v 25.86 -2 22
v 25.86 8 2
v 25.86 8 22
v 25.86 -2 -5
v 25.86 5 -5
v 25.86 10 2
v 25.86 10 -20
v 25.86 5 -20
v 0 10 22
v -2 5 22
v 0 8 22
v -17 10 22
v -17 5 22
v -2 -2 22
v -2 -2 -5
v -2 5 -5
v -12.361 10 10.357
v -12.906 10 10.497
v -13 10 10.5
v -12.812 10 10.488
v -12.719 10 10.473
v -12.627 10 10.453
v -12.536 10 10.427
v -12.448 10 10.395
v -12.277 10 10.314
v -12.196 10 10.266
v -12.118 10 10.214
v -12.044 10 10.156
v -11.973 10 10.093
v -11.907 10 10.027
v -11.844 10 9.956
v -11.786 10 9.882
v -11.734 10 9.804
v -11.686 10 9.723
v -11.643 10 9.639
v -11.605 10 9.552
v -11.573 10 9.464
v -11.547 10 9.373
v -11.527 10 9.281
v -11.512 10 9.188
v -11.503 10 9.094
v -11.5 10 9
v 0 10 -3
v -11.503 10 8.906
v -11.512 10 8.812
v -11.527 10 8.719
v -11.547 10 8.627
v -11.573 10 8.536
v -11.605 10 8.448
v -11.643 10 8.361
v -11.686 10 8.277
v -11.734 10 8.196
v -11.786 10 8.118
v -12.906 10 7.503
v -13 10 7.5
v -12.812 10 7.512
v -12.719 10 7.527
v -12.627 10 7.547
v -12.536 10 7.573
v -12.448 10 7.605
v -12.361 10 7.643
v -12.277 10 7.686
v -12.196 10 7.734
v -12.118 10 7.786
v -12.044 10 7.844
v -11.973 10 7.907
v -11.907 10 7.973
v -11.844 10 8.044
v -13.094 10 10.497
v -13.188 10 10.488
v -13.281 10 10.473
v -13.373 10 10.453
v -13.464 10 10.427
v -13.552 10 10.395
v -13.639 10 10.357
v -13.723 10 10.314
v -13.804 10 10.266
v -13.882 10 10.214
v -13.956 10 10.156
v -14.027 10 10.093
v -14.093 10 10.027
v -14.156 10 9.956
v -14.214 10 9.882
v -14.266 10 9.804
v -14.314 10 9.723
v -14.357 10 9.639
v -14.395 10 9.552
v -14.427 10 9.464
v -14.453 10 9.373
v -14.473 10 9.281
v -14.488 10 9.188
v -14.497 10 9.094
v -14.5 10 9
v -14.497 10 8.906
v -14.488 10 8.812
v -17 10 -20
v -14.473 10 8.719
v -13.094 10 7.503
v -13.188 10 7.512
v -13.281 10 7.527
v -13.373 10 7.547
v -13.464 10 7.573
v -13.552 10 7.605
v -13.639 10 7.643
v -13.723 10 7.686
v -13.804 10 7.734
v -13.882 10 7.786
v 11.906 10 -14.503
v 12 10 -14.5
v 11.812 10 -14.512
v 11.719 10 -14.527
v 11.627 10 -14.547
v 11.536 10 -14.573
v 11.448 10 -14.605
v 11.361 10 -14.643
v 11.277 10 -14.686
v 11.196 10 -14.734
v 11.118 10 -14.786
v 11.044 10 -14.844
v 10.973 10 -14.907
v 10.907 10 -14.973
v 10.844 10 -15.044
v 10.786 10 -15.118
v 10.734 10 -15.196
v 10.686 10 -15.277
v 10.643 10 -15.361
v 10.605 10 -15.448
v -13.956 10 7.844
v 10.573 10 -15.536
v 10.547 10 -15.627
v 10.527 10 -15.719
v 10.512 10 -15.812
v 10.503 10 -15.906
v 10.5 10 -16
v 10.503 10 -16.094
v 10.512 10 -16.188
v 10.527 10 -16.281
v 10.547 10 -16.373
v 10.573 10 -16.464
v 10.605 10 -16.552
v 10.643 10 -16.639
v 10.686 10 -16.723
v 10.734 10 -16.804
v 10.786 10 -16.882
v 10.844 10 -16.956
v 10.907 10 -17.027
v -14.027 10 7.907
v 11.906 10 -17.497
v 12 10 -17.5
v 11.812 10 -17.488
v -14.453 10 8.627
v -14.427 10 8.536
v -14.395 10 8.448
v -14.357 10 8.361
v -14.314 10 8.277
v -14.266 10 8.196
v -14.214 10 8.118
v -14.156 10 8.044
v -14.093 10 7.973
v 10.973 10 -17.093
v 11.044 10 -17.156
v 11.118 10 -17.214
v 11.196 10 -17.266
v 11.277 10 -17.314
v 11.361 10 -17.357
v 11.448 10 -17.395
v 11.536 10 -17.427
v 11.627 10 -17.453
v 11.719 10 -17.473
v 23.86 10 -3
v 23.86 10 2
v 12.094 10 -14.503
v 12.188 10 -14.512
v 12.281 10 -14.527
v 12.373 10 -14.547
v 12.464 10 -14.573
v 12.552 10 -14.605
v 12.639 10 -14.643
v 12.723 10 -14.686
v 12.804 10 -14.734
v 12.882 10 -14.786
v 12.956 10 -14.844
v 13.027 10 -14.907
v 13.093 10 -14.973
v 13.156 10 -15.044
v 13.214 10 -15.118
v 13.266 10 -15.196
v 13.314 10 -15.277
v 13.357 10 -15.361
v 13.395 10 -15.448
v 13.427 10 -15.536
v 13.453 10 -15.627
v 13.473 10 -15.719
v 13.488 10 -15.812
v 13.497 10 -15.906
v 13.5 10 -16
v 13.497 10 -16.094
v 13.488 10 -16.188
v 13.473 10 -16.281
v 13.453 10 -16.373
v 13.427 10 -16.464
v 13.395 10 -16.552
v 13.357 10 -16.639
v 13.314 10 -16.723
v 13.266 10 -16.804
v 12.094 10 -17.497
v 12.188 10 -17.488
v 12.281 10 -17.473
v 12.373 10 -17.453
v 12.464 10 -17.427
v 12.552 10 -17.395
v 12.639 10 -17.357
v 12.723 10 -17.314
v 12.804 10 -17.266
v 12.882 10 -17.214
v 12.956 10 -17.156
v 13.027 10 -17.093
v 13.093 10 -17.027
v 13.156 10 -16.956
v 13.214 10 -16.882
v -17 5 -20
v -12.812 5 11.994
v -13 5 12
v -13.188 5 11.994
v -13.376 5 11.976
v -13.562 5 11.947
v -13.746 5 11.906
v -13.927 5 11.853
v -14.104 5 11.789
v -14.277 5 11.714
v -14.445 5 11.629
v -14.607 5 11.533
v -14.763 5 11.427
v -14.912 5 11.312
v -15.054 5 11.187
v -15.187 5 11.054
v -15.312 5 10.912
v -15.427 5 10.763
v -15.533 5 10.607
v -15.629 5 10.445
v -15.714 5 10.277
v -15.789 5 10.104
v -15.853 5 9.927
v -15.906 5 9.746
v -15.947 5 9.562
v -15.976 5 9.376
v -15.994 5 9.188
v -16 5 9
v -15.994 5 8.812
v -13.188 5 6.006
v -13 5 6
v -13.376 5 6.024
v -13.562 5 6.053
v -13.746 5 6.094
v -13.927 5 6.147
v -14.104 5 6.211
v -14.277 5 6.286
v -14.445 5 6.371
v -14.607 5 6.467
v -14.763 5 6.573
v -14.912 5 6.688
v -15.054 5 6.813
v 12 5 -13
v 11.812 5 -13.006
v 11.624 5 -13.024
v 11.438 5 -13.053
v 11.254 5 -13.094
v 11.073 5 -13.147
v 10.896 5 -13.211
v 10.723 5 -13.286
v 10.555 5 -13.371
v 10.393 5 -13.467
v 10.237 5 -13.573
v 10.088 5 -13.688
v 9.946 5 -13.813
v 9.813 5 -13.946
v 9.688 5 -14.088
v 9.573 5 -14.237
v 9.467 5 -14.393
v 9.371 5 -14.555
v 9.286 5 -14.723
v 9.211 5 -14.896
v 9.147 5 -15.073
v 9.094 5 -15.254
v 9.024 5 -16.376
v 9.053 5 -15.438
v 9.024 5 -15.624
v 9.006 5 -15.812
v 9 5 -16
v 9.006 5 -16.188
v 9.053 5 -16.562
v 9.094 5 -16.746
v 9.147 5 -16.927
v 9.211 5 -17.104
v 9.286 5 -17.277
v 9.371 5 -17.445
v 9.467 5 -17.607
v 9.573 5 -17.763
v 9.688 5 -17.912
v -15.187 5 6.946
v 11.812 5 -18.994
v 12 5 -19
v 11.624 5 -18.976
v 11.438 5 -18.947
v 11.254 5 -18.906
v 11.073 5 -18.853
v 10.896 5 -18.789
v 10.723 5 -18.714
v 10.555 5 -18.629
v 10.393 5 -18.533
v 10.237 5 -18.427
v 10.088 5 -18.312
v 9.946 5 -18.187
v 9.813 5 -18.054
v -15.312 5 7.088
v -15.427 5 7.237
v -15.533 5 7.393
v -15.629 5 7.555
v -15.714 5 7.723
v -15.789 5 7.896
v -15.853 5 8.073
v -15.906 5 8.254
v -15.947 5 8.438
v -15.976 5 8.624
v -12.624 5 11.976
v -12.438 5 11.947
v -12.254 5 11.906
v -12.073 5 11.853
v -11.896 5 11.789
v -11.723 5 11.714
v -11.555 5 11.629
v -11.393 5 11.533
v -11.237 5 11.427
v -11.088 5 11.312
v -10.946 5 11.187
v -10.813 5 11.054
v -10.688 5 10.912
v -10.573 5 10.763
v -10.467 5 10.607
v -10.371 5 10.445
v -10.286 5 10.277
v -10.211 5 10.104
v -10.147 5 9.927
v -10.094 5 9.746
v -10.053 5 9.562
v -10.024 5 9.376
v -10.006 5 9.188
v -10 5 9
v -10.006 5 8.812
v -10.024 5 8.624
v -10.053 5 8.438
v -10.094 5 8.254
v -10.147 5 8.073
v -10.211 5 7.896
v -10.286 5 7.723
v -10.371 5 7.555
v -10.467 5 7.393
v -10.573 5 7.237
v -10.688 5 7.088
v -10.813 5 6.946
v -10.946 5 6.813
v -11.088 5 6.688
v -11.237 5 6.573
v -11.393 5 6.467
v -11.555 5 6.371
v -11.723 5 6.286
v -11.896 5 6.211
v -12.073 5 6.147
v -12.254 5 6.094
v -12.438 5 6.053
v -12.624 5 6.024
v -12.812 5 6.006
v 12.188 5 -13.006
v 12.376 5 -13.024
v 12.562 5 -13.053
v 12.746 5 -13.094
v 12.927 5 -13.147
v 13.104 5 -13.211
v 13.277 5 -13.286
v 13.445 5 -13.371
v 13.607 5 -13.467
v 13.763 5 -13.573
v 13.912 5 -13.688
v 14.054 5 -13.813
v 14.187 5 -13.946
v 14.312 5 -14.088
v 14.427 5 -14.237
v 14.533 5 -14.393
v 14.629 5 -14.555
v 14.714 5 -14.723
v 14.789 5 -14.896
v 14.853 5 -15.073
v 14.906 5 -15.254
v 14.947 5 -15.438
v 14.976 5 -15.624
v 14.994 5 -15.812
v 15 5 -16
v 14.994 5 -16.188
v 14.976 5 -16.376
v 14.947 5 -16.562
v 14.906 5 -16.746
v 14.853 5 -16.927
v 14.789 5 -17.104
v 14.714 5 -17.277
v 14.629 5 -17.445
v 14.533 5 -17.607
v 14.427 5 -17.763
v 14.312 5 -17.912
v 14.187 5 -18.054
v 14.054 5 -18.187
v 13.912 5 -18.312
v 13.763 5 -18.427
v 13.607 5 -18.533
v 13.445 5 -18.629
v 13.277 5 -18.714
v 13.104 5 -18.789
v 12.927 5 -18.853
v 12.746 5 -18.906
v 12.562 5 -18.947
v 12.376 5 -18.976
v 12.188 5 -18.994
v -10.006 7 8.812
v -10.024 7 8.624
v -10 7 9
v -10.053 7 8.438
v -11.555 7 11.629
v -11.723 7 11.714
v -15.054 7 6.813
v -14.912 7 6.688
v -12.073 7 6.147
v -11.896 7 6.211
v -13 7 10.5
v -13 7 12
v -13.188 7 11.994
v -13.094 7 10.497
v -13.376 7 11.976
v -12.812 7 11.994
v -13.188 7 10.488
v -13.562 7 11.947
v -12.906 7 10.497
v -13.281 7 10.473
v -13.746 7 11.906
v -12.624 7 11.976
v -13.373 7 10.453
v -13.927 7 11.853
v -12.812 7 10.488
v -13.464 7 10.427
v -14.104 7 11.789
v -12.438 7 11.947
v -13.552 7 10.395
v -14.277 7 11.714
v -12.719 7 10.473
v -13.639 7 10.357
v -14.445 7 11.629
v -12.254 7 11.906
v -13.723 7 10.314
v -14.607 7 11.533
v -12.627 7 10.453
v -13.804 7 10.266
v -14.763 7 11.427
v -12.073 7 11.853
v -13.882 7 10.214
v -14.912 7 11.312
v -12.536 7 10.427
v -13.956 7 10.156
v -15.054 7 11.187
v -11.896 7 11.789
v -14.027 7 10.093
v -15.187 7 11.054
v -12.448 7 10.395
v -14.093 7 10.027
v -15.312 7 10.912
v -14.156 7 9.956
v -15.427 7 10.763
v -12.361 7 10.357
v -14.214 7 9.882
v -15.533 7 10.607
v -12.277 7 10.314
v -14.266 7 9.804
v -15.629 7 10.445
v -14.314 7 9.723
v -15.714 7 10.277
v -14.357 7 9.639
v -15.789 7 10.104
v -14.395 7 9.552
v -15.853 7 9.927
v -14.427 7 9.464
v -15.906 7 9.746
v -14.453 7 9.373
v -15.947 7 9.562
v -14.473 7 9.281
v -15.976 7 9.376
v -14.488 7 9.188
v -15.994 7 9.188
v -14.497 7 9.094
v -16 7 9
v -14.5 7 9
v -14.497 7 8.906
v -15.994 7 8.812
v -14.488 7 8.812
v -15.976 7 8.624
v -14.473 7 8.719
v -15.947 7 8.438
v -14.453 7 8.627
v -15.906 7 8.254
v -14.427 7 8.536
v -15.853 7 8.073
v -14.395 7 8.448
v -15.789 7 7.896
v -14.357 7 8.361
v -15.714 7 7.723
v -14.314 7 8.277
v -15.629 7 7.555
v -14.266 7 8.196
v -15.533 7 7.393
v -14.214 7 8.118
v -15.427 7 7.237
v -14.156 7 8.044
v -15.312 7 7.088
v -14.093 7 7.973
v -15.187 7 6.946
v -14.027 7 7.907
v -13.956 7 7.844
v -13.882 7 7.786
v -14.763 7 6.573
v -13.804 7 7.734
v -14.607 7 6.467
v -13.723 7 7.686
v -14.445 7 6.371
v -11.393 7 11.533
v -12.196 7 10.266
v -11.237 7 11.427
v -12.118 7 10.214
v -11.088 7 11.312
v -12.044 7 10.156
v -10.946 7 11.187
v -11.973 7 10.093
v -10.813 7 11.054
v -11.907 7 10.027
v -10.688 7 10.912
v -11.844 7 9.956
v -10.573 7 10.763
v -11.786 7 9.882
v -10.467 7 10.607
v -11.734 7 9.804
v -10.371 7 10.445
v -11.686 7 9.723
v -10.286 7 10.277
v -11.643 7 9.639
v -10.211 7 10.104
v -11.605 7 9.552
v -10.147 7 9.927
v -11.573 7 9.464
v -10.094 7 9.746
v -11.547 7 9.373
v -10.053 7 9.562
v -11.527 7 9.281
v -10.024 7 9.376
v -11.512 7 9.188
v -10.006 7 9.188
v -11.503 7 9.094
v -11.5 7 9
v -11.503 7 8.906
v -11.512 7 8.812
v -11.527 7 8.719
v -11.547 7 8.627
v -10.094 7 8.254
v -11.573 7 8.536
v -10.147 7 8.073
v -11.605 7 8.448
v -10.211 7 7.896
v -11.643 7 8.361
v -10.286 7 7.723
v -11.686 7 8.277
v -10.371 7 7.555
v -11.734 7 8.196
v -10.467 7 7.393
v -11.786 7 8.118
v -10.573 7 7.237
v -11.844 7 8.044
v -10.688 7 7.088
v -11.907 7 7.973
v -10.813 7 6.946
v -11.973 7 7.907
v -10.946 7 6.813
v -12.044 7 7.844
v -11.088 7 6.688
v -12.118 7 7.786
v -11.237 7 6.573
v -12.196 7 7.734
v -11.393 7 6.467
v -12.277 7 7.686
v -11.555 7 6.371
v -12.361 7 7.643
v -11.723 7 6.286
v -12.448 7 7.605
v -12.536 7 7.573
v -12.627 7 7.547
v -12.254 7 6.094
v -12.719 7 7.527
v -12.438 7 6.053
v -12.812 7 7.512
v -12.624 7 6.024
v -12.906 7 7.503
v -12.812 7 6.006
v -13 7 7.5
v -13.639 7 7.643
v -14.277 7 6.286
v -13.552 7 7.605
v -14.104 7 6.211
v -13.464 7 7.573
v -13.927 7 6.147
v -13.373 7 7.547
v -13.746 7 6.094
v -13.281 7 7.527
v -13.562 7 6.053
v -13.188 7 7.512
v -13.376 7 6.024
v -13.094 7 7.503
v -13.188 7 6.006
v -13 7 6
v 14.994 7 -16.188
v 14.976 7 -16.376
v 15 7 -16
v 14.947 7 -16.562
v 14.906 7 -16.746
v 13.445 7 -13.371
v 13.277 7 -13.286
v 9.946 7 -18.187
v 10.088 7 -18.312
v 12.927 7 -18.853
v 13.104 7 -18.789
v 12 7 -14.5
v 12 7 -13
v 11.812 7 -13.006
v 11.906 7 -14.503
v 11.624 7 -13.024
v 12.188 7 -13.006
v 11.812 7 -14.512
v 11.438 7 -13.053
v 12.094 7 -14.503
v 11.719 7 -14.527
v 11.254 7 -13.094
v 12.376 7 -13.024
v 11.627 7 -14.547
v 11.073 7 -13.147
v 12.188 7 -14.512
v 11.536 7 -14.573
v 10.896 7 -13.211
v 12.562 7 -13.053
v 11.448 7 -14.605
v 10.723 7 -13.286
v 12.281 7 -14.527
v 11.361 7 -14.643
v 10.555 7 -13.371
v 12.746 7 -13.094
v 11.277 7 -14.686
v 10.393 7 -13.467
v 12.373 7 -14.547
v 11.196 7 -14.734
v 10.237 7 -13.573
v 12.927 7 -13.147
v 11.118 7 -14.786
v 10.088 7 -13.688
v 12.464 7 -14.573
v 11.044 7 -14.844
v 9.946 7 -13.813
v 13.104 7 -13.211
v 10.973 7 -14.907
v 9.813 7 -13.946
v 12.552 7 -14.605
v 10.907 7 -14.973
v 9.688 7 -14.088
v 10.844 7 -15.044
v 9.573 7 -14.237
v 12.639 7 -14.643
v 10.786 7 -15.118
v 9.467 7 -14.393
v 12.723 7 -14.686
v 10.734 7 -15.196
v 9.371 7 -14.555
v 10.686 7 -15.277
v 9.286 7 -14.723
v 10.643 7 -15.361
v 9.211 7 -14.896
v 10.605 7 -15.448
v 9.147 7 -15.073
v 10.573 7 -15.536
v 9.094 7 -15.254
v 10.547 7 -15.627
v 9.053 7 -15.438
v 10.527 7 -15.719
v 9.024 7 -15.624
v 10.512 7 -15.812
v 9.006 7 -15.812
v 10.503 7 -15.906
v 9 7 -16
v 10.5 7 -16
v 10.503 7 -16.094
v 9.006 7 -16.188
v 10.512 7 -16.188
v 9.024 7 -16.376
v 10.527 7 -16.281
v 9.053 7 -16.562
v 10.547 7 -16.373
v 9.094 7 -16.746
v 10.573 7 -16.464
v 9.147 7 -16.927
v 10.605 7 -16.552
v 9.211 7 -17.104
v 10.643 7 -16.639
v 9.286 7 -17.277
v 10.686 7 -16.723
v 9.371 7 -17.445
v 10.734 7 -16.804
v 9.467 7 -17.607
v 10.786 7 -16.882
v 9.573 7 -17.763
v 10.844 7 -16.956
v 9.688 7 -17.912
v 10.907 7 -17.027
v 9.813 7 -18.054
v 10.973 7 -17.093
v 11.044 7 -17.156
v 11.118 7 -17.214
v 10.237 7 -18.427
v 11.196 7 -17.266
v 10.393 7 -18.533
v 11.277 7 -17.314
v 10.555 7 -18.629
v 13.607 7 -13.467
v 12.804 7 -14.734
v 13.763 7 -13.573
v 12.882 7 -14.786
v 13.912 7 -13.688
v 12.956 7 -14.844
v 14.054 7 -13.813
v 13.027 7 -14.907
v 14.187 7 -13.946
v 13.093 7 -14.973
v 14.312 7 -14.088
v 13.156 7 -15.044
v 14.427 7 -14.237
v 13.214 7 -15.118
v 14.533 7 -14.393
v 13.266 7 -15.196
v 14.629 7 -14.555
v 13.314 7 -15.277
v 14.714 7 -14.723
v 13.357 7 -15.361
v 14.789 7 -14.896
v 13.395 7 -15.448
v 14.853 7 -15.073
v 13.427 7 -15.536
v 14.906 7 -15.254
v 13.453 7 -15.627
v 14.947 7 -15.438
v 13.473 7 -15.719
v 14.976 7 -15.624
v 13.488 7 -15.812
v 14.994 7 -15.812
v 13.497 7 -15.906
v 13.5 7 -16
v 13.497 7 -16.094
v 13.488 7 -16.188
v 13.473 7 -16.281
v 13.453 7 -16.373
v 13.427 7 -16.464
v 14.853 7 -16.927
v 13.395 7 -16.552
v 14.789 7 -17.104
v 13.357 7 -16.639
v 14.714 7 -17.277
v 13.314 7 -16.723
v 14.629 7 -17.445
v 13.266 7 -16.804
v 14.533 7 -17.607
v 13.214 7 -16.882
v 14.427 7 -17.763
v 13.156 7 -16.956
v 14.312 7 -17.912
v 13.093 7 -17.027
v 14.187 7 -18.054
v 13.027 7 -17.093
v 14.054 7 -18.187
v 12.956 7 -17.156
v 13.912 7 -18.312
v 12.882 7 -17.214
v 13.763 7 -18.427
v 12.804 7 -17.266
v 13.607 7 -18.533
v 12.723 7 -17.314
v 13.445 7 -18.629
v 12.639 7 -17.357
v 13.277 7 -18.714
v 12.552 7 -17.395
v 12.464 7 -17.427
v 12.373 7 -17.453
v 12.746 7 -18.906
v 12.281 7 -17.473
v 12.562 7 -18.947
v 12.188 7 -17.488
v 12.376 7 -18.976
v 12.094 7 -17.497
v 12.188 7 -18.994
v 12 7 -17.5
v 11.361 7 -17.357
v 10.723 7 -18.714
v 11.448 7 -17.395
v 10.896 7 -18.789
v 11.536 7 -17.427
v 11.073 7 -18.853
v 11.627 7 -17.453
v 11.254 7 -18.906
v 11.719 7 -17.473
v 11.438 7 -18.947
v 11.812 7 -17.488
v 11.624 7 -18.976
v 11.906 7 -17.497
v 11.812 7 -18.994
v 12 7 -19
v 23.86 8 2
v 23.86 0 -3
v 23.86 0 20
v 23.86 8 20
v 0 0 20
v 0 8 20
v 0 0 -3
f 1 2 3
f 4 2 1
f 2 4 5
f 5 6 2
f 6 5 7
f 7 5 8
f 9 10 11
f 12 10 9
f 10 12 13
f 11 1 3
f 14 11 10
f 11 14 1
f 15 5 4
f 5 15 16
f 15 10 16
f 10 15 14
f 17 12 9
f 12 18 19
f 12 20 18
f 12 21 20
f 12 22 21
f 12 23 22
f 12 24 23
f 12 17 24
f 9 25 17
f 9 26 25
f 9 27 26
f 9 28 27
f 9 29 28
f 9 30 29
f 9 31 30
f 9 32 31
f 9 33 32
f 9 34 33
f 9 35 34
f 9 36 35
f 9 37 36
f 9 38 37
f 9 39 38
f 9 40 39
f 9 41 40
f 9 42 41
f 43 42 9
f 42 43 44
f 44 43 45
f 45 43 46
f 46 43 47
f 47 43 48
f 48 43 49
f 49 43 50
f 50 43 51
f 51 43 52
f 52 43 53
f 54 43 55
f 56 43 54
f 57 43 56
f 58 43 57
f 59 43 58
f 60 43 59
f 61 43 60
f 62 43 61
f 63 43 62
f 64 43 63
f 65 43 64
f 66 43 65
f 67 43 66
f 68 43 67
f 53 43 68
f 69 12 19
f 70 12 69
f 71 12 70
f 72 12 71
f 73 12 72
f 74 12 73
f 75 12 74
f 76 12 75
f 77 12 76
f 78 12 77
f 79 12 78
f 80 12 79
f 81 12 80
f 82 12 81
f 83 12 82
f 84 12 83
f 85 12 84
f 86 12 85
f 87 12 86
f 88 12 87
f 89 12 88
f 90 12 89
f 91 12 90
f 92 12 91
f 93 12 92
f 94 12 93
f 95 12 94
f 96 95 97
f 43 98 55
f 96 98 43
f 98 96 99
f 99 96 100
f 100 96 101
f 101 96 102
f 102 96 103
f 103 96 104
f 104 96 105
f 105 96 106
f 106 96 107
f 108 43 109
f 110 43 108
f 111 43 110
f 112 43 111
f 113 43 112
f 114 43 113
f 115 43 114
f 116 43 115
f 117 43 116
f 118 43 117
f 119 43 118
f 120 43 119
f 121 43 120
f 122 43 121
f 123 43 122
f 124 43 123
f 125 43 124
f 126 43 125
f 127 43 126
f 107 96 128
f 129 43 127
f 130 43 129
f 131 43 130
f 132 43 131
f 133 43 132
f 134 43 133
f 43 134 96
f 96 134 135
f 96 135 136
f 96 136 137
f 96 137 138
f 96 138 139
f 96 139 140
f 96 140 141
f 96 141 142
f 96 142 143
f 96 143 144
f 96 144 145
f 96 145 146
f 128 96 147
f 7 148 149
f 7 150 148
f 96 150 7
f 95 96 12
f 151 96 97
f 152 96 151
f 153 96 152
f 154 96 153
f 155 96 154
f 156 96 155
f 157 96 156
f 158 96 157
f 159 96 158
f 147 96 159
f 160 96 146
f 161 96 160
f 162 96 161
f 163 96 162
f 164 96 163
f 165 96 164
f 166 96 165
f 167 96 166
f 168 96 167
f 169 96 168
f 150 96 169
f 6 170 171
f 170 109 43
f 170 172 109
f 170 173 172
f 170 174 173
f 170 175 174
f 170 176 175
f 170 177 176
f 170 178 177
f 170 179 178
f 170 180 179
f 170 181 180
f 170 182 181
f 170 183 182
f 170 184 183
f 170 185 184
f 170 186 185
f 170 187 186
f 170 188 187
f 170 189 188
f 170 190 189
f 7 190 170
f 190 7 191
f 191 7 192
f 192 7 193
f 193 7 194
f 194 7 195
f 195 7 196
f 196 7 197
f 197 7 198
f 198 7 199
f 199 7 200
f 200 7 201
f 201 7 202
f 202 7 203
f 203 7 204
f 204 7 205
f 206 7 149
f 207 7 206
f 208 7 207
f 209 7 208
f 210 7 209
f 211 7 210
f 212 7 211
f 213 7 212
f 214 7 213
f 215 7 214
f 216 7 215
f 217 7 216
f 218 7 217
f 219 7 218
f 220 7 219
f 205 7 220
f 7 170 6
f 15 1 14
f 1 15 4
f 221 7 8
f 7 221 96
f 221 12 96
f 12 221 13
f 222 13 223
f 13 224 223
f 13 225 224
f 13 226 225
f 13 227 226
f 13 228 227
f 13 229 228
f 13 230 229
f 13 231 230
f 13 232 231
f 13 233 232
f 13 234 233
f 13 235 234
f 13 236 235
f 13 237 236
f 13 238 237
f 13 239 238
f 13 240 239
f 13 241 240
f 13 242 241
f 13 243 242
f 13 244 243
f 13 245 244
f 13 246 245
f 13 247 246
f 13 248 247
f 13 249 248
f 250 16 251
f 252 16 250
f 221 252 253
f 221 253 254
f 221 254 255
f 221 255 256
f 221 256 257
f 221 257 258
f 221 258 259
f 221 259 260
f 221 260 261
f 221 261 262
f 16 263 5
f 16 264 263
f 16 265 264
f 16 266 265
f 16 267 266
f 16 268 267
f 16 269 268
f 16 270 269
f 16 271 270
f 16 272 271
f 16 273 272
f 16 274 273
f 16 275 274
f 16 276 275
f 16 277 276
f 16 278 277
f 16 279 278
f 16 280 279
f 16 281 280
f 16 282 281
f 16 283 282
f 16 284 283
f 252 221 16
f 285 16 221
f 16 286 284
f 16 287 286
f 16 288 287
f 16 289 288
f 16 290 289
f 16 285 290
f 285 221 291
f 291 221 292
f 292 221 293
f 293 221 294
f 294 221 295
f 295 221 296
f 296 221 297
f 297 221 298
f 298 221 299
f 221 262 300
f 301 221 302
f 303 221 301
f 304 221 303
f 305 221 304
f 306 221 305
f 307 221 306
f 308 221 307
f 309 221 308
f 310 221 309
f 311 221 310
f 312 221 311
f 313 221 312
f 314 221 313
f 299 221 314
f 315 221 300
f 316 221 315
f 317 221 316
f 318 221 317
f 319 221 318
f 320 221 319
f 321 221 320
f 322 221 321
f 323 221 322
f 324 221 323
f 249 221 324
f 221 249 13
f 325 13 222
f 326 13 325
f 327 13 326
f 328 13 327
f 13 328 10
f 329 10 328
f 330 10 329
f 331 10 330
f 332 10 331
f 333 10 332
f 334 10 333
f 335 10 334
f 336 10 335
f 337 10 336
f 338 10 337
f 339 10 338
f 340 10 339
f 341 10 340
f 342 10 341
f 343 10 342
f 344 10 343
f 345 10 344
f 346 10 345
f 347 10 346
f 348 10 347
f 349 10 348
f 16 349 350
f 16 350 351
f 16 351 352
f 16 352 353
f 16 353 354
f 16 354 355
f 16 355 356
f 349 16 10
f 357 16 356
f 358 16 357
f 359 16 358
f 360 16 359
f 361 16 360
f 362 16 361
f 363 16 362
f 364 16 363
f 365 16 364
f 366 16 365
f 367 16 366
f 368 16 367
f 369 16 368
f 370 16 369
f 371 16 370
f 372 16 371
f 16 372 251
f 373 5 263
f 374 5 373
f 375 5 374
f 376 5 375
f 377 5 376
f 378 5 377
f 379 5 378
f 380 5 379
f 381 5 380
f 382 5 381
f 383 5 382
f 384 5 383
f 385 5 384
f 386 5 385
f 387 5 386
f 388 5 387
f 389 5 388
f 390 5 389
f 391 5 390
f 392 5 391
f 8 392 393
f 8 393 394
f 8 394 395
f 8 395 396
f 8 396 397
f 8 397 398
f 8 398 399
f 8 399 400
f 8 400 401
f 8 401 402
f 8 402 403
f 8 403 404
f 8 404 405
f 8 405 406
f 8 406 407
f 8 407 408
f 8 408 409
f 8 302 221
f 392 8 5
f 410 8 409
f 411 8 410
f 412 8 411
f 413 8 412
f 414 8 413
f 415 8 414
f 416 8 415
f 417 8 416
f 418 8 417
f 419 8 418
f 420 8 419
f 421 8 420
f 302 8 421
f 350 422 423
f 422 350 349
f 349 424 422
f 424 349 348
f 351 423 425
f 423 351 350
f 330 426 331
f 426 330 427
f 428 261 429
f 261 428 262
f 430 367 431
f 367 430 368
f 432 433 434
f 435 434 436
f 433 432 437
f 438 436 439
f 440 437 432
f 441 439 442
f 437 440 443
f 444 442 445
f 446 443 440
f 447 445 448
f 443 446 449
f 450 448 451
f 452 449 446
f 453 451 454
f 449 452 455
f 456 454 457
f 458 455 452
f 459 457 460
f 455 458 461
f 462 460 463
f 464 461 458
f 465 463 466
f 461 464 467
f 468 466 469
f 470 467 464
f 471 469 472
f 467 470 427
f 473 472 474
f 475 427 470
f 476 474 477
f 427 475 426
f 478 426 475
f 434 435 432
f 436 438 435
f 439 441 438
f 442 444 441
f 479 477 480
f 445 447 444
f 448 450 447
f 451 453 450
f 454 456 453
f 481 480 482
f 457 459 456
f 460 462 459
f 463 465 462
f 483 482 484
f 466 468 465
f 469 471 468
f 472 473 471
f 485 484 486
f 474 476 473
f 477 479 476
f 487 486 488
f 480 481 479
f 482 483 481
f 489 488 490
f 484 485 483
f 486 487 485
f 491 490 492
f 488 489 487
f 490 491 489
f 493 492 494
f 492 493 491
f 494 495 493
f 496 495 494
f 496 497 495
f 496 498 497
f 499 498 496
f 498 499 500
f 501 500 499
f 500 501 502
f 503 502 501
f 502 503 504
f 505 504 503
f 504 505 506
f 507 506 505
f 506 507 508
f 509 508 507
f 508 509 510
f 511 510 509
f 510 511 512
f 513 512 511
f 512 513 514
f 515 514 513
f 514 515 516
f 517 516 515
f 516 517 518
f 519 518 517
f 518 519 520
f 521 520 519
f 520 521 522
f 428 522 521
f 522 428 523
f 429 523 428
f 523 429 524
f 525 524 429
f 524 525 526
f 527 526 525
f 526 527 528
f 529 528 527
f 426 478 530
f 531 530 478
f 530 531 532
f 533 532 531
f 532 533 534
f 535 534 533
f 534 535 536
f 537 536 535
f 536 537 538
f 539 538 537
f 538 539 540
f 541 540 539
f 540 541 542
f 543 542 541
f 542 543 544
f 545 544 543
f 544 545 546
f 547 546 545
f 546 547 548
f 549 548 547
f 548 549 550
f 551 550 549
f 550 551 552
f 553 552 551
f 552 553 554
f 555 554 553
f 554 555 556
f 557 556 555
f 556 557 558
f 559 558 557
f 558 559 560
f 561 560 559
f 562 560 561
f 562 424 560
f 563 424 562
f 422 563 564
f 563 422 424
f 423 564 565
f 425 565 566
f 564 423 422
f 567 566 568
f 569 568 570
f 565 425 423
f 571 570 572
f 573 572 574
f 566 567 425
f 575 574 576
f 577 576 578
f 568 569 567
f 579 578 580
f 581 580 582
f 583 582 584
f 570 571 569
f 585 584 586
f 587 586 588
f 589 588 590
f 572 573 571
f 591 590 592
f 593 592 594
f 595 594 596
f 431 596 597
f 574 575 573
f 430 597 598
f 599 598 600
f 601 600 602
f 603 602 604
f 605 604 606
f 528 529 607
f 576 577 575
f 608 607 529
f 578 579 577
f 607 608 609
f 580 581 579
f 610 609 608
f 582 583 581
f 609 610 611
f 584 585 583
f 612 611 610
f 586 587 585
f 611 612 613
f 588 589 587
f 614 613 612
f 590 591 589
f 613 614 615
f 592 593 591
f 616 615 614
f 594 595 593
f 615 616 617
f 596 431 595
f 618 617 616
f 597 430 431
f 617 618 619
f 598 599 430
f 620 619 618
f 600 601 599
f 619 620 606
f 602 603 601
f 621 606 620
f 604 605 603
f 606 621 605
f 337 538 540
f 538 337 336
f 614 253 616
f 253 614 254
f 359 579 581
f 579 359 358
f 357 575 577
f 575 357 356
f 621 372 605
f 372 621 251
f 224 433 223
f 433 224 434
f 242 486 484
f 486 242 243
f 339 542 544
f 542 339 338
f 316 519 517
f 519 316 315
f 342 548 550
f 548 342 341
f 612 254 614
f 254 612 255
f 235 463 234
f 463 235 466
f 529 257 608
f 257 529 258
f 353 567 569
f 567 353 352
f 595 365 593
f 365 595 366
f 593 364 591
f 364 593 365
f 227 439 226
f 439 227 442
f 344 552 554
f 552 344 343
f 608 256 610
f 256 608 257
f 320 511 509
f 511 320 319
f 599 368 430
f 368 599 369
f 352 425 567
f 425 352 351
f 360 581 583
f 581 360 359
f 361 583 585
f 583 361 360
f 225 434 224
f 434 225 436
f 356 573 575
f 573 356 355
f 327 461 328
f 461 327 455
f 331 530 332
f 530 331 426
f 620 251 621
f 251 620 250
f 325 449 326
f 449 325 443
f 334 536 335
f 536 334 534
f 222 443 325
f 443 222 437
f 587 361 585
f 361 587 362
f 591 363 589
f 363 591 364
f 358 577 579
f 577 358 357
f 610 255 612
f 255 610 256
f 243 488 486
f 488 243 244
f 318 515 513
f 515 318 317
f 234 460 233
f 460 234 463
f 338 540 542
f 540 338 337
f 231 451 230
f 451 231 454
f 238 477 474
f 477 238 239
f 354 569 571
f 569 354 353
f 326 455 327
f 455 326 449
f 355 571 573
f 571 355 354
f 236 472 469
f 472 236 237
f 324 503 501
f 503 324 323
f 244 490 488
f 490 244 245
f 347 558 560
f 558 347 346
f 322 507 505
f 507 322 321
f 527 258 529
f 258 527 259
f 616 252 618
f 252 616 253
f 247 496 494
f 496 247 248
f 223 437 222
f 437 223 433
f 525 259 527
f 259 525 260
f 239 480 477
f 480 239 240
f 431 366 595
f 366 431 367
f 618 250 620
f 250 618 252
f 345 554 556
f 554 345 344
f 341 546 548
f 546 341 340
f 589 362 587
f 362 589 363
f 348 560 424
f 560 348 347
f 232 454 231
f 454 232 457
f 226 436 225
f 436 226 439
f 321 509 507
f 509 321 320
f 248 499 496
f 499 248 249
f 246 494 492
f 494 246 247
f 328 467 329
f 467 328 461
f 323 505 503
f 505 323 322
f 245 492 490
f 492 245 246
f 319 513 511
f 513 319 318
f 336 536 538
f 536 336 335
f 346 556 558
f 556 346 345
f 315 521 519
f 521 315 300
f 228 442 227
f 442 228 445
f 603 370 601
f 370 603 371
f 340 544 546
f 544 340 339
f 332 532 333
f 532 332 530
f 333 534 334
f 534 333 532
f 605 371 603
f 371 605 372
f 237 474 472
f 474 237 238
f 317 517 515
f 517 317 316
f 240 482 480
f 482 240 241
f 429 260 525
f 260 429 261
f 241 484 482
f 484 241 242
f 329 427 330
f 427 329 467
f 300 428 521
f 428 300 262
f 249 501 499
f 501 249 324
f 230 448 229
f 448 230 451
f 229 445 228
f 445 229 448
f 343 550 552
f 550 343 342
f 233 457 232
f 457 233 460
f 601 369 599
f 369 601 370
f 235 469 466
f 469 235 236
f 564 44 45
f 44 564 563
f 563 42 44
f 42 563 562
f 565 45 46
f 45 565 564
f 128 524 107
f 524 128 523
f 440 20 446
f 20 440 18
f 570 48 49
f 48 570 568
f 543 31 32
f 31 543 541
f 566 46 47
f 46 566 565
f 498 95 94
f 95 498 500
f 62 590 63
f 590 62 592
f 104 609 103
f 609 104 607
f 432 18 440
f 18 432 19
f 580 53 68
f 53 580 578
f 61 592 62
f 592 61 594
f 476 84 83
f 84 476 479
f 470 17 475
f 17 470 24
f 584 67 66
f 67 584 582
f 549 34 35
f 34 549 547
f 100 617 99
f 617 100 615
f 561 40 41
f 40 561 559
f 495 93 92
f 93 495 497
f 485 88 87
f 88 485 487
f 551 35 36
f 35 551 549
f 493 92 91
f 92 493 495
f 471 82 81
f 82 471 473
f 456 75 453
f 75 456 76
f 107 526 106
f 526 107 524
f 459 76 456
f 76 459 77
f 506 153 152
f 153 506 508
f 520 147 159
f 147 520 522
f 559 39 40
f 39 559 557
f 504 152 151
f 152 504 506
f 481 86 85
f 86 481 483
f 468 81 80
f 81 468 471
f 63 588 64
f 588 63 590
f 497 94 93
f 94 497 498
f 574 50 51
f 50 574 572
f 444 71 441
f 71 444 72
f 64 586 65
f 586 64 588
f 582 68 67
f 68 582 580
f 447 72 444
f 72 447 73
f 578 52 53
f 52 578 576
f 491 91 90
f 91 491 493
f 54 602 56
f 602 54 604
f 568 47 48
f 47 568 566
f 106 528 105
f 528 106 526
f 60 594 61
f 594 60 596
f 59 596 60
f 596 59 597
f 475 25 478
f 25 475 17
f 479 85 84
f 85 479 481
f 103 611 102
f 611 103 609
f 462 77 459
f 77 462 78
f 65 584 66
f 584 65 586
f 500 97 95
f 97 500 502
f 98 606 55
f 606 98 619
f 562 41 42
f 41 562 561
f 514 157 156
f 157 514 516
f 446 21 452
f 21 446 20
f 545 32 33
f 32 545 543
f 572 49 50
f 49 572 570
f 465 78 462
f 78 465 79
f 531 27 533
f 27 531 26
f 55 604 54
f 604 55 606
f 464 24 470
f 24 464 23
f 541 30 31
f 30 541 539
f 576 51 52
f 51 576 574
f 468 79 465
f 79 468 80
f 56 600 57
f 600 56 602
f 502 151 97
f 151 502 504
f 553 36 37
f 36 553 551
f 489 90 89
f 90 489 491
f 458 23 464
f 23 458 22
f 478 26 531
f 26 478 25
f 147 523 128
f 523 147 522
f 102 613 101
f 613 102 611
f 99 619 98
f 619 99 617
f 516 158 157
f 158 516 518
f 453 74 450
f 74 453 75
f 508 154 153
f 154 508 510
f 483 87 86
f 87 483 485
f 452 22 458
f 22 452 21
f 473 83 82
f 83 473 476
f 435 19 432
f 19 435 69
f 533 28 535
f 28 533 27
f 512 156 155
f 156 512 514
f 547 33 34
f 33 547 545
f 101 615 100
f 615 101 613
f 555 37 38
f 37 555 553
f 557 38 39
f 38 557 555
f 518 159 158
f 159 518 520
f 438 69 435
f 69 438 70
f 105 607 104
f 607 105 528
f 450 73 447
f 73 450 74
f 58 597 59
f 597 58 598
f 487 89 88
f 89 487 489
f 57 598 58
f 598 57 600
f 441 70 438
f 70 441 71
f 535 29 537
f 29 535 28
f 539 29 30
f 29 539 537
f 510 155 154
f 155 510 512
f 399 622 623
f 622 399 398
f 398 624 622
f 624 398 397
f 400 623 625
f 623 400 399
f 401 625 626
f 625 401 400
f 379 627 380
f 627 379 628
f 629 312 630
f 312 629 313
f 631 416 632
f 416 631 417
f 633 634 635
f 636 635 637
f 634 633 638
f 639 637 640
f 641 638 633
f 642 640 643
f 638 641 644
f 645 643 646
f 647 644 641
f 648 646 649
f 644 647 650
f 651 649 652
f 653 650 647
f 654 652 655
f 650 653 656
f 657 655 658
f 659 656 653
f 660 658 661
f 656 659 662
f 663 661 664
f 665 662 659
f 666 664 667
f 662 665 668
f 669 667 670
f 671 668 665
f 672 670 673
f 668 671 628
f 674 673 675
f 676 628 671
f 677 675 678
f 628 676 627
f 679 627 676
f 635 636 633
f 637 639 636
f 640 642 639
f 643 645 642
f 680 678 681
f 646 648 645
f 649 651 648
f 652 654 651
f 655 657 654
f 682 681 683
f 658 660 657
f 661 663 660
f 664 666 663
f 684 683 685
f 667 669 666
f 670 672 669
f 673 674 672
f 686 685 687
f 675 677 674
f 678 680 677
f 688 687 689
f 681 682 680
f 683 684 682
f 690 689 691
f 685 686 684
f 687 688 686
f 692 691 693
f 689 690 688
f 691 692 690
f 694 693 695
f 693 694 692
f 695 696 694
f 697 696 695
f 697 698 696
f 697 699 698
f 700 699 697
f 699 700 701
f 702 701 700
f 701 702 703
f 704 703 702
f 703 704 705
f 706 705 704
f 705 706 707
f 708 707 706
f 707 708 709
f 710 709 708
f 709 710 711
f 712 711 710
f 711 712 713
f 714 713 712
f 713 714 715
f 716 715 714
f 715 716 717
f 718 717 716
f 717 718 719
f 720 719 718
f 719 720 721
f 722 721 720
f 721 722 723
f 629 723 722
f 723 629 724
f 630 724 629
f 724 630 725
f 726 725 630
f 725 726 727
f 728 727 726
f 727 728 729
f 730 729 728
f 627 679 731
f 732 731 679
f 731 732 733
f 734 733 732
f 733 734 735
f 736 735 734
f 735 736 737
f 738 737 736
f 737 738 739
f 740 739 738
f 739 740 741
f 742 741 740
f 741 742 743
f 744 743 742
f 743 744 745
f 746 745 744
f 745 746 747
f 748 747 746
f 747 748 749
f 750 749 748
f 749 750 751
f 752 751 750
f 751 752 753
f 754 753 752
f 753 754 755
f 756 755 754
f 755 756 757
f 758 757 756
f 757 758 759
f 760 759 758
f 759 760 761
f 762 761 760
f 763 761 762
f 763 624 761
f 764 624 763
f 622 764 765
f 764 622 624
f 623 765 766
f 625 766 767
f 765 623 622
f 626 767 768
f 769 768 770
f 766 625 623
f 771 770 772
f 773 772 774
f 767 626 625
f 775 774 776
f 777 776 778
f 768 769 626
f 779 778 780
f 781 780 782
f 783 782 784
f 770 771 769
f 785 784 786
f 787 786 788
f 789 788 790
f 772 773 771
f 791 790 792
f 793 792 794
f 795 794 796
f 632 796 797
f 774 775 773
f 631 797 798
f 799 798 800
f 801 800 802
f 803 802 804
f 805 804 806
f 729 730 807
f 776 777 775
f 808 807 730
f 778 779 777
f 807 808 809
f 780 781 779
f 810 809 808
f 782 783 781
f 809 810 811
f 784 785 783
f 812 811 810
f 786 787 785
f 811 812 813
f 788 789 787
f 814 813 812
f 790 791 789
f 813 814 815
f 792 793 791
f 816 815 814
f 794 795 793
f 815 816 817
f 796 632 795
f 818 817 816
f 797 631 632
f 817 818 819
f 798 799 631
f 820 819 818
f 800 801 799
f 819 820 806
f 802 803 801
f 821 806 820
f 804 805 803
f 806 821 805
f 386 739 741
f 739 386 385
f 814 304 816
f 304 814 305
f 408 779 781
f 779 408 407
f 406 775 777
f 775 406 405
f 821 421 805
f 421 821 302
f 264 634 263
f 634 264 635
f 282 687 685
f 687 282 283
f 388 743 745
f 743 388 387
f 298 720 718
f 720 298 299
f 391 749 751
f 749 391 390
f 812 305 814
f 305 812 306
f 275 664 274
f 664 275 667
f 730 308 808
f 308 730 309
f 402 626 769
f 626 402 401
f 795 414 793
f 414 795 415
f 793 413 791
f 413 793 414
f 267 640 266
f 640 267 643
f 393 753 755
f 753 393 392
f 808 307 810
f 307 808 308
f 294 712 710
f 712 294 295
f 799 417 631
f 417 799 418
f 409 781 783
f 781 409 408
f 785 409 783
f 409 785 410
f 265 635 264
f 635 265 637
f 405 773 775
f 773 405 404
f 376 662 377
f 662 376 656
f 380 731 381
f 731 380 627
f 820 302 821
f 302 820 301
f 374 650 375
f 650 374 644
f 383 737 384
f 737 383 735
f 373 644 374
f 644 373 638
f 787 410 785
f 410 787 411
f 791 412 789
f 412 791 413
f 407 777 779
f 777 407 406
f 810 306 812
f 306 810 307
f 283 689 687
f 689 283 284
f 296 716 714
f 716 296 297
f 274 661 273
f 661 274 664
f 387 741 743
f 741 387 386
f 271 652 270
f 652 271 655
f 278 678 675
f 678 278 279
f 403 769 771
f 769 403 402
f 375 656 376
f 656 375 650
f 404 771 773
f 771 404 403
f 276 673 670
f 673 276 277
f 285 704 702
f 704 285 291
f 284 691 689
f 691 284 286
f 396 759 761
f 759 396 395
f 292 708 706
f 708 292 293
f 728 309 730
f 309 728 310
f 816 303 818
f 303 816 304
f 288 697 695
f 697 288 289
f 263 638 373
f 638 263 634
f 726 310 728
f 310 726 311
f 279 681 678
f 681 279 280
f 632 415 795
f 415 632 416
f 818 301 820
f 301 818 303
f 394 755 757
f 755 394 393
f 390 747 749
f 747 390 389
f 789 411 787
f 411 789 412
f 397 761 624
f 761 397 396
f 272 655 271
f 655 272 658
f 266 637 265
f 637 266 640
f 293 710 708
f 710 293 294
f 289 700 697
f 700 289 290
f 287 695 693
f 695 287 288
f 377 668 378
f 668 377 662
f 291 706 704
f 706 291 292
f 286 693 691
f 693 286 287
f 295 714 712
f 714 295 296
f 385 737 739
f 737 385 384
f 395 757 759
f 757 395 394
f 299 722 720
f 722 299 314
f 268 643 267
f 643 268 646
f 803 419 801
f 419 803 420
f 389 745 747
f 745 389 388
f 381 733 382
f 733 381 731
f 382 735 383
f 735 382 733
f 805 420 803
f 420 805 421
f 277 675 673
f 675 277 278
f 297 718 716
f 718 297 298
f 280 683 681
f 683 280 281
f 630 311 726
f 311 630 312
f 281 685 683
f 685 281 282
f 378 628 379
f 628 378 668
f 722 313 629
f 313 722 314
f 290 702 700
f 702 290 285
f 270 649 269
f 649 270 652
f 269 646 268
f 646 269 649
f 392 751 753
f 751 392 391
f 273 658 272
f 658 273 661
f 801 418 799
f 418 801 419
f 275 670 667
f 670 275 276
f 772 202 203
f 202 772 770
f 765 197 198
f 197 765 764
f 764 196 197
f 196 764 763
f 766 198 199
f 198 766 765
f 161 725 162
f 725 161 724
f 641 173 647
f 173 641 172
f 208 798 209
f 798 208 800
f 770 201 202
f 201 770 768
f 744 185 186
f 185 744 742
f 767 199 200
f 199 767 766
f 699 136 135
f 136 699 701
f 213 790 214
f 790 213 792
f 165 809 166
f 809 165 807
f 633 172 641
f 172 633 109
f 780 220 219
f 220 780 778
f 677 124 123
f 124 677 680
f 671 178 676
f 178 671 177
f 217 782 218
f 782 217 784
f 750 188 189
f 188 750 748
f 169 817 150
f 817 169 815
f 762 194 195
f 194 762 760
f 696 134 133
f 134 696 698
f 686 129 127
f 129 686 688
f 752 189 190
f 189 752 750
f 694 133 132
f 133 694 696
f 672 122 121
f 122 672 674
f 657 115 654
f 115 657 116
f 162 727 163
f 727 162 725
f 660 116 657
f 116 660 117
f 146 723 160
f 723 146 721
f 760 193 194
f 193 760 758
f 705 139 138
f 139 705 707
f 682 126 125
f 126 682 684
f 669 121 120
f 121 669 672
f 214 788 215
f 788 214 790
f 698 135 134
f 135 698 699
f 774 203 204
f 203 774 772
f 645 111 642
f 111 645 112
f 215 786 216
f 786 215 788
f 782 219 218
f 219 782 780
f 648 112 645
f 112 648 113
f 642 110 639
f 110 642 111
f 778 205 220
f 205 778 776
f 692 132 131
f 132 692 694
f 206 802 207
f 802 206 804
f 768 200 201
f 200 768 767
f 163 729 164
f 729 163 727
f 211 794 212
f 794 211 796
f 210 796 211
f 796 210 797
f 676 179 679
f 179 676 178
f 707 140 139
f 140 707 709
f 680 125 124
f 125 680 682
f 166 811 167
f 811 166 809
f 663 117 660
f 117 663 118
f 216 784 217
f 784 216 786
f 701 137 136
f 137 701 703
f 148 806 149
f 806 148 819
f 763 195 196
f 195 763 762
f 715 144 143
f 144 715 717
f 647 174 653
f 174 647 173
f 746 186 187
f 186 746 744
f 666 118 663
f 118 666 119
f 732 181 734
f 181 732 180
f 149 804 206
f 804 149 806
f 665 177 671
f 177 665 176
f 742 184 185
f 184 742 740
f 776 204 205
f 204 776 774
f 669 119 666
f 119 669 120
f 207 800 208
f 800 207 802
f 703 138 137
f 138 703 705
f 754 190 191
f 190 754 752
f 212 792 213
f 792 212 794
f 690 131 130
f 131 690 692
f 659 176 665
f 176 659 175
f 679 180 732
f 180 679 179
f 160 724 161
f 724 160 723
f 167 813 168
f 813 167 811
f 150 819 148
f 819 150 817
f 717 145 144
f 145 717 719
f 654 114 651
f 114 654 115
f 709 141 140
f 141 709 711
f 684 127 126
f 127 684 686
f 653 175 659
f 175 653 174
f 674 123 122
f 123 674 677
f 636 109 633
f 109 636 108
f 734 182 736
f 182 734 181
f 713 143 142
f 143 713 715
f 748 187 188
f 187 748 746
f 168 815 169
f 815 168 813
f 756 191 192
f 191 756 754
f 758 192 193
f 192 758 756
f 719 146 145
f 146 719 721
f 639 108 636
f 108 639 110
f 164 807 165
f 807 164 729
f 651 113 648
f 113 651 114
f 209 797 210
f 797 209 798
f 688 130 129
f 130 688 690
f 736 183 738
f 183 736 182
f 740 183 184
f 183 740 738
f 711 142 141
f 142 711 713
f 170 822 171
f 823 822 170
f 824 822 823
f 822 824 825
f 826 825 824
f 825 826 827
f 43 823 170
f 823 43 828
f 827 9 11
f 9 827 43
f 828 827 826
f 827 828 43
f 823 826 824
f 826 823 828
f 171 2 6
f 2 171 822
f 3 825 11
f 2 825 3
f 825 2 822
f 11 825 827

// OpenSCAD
$fn = 100;

d = 2.54;


module led() {
    r = 5/2;
    h = 6;
    hcyl = h - r;
    color("white")
    translate([0, 0, h - r])
        sphere(r = r);
    color("white")
    cylinder(h = h - r , r = r);
    color("gray")
    translate([-d/2, 0, -30+0.01])
        cylinder(h = 30, r = 0.5);
    color("gray")
    translate([d/2, 0, -30+0.01])
        cylinder(h = 30, r = 0.5);
}


module lsr() {
    cylinder(h = 2, r = 5/2);
    translate([-d/2, 0, -30+0.01])
        cylinder(h = 30, r = 0.5);
    translate([d/2, 0, -30+0.01])
        cylinder(h = 30, r = 0.5);
}


module perfboard(nx, ny) {
    difference() {
        cube([d*(nx+1), d*(ny+1), 2]);
        for (i = [1:nx]) {
            for (j = [1:ny]) {
                translate([d*i, d*j, -0.1])
                    cylinder(h = 2.2, r = 0.5);
            }
        }
    }
}



module reader_part() {
    //Base below the led and bottom plate
    //color("yellow")
    difference() {
        union() {
            cube([d*3, 2+6, 7]);
            cube([d*3, 7 + 3 + 7, 2]);
        }
        union() {
            translate([d*3/2-d/2, 3, -0.1])
                cylinder(r = 1, h = 2+6+0.2);
            translate([d*3/2+d/2, 3, -0.1])
                cylinder(r = 1, h = 2+6+0.2);
        }
    }
    // Opening in front of led
    //color("pink")
    translate([0, 6, 7-0.01])
    difference() {
        cube([d*3, 2, 3+4+5]);
        translate([d*3/2, 2.1, 2+3])
            rotate([90, 0, 0])
            cylinder(r = 6/2, h = 2.2);
    }
    // Side plate next to led
    //color("orange")
    translate([0, 0, 7-0.01])
        cube([1, 2+6, 3+4+5]);
    //color("lightgreen") {
    translate([0, 0, -3])
        cube([1, 7+3+7, 3]);
    translate([d*3-1, 0, -3])
        cube([1, 7+3+7, 3]);
    translate([d*3*0.5-0.5, 0, -3])
        cube([1, 7+3+7, 3]);
    translate([0, 0, -3])
        cube([d*3, 1, 3]);
    //}
    // The part containing the light sensitive resistor
    //color("green")
    difference() {
        translate([0, 7+3, 0])
            cube([d*3, 7, 3+4+5+7]);
        union() {
            translate([3*d/2, -0.1 + 7+3, 12])
                rotate([-90, 0, 0])
                cylinder(r=6/2, h = 5);
            translate([d*3/2-d/2, -0.1 + 7 + 3, 12])
                rotate([-90, 0, 0])
                cylinder(r = 1, h = 2+6+0.2);
            translate([d*3/2+d/2, -0.1 + 7 + 3, 12])
                rotate([-90, 0, 0])
                cylinder(r = 1, h = 2+6+0.2);
        }
    }
}


if (false) {
reader_part();
translate([3*d, 0, 0]) reader_part();
translate([3*d*2, 0, 0]) reader_part();
}

// ==============================================================
// CARD
//color("gray") {
//translate([0, 8.25, 2.0]) 
//
//  difference() {
//  cube([150, 0.8, 210]);
//    
//    translate([d*1.5, -1, 10])
//      rotate([-90, 0, 0])
//      cylinder(r = 1.5, h = 5);
//    translate([d*3+d*1.5, -1.2, 10])
//      rotate([-90, 0, 0])
//      cylinder(r = 1.5, h = 1.5);
//    translate([d*6+d*1.5, -1.2, 10])
//      rotate([-90, 0, 0])
//      cylinder(r = 1.5, h = 1.5);
//  }
//}

//// Example light sensitive resistor
//translate([3*d*0, 0, 0])
//    translate([3*d/2, 7+3+5-1, 12])
//    rotate([90, 0, 0])
//    lsr();
//translate([3*d*1, 0, 0])
//    translate([3*d/2, 7+3+5-1, 12])
//    rotate([90, 0, 0])
//    lsr();
//translate([3*d*2, 0, 0])
//    translate([3*d/2, 7+3+5-1, 12])
//    rotate([90, 0, 0])
//    lsr();
//
//translate([3*d*0, 0, 0])
//    translate([d*3/2, 3, 7.5]) led();
//translate([3*d, 0, 0])
//    translate([d*3/2, 3, 7.5]) led();
//translate([3*d*2, 0, 0])
//    translate([d*3/2, 3, 7.5]) led();
//
//color("darkgreen")
//
//translate([0, 7+3+7+1, 12+3*d])
//    rotate([-90, 0, 0])
//    perfboard(10, 10);



// =============================================================
// COVER
cover_padding = 1;
  cover_thickness = 2;
if (true) {
  
  translate([0, 0, -3]) {
    difference() {
      translate([-cover_thickness, -cover_thickness, -cover_thickness]) {
        cube([9*d+2*cover_thickness+cover_padding, 7+3+cover_thickness, 
          3+4+5+7+3+2*cover_thickness+cover_padding]);
        translate([-15, 7, -15])
        cube([9*d+2*cover_thickness+cover_padding+15, 3+cover_thickness, 
          3+4+5+7+3+2*cover_thickness+cover_padding+15]);
      }
      union() {
        cube([9*d+cover_padding, 7+3, 3+4+5+7+3+cover_padding]);
        translate([0, 7+1, 5])
          cube([100,2, 100]);
      
        translate([-15+2, 0, 12]) {
          rotate([-90, 0, 0])
          cylinder(r = 6/2, h = 7-cover_thickness+2);
          rotate([-90, 0, 0])
          cylinder(r = 3/2, h = 7-cover_thickness+20);
        }
        translate([12, 0, -15+2]) {
          rotate([-90, 0, 0])
          cylinder(r = 6/2, h = 7-cover_thickness+2);
          rotate([-90, 0, 0])
          cylinder(r = 3/2, h = 7-cover_thickness+20);
        }
      }
    }
  }
//  // flange with hole for screw
//  translate([0, 0, -3-(5+1+cover_thickness+4)]) {
//    difference() {
//      translate([-cover_thickness, 7-cover_thickness, -cover_thickness])
//        cube([9*d+2*cover_thickness+cover_padding, 3+cover_thickness, 5+5+cover_thickness]);
//      union() {
//        translate([9*d/2, 0, 2])
//          rotate([-90, 0, 0])
//          cylinder(r = 6/2, h = 7-cover_thickness+2);
//        translate([9*d/2, 0, 2])
//          rotate([-90, 0, 0])
//          cylinder(r = 3/2, h = 7-cover_thickness+20);
//      }
//    }
//  }
//  
//  // flange with hole for screw
//  translate([0, 0, -3-(5+5+cover_thickness)]) {
//    difference() {
//      translate([-cover_thickness, 7-cover_thickness, -cover_thickness])
//        cube([9*d+2*cover_thickness+cover_padding, 3+cover_thickness, 5+5+cover_thickness]);
//      union() {
//        translate([9*d/2, 0, 2])
//          rotate([-90, 0, 0])
//          cylinder(r = 6/2, h = 7-cover_thickness+2);
//        translate([9*d/2, 0, 2])
//          rotate([-90, 0, 0])
//          cylinder(r = 3/2, h = 7-cover_thickness+20);
//      }
//    }
//  }
}


// =============================================================
// GUIDE
if (false) {
  translate([0, 0, -3]) {
    difference() {
      translate([0, 7-cover_thickness, -cover_thickness])
        cube([9*d, 3+cover_thickness, 5+4+cover_thickness]);
      union() {
        translate([-0.1, 7+1, 5])
          cube([100,2, 100]);
        translate([9*d/2, 0, 2])
      rotate([-90, 0, 0])
      cylinder(r = 6/2, h = 7-cover_thickness+2);
    translate([9*d/2, 0, 2])
      rotate([-90, 0, 0])
      cylinder(r = 3/2, h = 7-cover_thickness+20);
      }
    }
   
  }
}
